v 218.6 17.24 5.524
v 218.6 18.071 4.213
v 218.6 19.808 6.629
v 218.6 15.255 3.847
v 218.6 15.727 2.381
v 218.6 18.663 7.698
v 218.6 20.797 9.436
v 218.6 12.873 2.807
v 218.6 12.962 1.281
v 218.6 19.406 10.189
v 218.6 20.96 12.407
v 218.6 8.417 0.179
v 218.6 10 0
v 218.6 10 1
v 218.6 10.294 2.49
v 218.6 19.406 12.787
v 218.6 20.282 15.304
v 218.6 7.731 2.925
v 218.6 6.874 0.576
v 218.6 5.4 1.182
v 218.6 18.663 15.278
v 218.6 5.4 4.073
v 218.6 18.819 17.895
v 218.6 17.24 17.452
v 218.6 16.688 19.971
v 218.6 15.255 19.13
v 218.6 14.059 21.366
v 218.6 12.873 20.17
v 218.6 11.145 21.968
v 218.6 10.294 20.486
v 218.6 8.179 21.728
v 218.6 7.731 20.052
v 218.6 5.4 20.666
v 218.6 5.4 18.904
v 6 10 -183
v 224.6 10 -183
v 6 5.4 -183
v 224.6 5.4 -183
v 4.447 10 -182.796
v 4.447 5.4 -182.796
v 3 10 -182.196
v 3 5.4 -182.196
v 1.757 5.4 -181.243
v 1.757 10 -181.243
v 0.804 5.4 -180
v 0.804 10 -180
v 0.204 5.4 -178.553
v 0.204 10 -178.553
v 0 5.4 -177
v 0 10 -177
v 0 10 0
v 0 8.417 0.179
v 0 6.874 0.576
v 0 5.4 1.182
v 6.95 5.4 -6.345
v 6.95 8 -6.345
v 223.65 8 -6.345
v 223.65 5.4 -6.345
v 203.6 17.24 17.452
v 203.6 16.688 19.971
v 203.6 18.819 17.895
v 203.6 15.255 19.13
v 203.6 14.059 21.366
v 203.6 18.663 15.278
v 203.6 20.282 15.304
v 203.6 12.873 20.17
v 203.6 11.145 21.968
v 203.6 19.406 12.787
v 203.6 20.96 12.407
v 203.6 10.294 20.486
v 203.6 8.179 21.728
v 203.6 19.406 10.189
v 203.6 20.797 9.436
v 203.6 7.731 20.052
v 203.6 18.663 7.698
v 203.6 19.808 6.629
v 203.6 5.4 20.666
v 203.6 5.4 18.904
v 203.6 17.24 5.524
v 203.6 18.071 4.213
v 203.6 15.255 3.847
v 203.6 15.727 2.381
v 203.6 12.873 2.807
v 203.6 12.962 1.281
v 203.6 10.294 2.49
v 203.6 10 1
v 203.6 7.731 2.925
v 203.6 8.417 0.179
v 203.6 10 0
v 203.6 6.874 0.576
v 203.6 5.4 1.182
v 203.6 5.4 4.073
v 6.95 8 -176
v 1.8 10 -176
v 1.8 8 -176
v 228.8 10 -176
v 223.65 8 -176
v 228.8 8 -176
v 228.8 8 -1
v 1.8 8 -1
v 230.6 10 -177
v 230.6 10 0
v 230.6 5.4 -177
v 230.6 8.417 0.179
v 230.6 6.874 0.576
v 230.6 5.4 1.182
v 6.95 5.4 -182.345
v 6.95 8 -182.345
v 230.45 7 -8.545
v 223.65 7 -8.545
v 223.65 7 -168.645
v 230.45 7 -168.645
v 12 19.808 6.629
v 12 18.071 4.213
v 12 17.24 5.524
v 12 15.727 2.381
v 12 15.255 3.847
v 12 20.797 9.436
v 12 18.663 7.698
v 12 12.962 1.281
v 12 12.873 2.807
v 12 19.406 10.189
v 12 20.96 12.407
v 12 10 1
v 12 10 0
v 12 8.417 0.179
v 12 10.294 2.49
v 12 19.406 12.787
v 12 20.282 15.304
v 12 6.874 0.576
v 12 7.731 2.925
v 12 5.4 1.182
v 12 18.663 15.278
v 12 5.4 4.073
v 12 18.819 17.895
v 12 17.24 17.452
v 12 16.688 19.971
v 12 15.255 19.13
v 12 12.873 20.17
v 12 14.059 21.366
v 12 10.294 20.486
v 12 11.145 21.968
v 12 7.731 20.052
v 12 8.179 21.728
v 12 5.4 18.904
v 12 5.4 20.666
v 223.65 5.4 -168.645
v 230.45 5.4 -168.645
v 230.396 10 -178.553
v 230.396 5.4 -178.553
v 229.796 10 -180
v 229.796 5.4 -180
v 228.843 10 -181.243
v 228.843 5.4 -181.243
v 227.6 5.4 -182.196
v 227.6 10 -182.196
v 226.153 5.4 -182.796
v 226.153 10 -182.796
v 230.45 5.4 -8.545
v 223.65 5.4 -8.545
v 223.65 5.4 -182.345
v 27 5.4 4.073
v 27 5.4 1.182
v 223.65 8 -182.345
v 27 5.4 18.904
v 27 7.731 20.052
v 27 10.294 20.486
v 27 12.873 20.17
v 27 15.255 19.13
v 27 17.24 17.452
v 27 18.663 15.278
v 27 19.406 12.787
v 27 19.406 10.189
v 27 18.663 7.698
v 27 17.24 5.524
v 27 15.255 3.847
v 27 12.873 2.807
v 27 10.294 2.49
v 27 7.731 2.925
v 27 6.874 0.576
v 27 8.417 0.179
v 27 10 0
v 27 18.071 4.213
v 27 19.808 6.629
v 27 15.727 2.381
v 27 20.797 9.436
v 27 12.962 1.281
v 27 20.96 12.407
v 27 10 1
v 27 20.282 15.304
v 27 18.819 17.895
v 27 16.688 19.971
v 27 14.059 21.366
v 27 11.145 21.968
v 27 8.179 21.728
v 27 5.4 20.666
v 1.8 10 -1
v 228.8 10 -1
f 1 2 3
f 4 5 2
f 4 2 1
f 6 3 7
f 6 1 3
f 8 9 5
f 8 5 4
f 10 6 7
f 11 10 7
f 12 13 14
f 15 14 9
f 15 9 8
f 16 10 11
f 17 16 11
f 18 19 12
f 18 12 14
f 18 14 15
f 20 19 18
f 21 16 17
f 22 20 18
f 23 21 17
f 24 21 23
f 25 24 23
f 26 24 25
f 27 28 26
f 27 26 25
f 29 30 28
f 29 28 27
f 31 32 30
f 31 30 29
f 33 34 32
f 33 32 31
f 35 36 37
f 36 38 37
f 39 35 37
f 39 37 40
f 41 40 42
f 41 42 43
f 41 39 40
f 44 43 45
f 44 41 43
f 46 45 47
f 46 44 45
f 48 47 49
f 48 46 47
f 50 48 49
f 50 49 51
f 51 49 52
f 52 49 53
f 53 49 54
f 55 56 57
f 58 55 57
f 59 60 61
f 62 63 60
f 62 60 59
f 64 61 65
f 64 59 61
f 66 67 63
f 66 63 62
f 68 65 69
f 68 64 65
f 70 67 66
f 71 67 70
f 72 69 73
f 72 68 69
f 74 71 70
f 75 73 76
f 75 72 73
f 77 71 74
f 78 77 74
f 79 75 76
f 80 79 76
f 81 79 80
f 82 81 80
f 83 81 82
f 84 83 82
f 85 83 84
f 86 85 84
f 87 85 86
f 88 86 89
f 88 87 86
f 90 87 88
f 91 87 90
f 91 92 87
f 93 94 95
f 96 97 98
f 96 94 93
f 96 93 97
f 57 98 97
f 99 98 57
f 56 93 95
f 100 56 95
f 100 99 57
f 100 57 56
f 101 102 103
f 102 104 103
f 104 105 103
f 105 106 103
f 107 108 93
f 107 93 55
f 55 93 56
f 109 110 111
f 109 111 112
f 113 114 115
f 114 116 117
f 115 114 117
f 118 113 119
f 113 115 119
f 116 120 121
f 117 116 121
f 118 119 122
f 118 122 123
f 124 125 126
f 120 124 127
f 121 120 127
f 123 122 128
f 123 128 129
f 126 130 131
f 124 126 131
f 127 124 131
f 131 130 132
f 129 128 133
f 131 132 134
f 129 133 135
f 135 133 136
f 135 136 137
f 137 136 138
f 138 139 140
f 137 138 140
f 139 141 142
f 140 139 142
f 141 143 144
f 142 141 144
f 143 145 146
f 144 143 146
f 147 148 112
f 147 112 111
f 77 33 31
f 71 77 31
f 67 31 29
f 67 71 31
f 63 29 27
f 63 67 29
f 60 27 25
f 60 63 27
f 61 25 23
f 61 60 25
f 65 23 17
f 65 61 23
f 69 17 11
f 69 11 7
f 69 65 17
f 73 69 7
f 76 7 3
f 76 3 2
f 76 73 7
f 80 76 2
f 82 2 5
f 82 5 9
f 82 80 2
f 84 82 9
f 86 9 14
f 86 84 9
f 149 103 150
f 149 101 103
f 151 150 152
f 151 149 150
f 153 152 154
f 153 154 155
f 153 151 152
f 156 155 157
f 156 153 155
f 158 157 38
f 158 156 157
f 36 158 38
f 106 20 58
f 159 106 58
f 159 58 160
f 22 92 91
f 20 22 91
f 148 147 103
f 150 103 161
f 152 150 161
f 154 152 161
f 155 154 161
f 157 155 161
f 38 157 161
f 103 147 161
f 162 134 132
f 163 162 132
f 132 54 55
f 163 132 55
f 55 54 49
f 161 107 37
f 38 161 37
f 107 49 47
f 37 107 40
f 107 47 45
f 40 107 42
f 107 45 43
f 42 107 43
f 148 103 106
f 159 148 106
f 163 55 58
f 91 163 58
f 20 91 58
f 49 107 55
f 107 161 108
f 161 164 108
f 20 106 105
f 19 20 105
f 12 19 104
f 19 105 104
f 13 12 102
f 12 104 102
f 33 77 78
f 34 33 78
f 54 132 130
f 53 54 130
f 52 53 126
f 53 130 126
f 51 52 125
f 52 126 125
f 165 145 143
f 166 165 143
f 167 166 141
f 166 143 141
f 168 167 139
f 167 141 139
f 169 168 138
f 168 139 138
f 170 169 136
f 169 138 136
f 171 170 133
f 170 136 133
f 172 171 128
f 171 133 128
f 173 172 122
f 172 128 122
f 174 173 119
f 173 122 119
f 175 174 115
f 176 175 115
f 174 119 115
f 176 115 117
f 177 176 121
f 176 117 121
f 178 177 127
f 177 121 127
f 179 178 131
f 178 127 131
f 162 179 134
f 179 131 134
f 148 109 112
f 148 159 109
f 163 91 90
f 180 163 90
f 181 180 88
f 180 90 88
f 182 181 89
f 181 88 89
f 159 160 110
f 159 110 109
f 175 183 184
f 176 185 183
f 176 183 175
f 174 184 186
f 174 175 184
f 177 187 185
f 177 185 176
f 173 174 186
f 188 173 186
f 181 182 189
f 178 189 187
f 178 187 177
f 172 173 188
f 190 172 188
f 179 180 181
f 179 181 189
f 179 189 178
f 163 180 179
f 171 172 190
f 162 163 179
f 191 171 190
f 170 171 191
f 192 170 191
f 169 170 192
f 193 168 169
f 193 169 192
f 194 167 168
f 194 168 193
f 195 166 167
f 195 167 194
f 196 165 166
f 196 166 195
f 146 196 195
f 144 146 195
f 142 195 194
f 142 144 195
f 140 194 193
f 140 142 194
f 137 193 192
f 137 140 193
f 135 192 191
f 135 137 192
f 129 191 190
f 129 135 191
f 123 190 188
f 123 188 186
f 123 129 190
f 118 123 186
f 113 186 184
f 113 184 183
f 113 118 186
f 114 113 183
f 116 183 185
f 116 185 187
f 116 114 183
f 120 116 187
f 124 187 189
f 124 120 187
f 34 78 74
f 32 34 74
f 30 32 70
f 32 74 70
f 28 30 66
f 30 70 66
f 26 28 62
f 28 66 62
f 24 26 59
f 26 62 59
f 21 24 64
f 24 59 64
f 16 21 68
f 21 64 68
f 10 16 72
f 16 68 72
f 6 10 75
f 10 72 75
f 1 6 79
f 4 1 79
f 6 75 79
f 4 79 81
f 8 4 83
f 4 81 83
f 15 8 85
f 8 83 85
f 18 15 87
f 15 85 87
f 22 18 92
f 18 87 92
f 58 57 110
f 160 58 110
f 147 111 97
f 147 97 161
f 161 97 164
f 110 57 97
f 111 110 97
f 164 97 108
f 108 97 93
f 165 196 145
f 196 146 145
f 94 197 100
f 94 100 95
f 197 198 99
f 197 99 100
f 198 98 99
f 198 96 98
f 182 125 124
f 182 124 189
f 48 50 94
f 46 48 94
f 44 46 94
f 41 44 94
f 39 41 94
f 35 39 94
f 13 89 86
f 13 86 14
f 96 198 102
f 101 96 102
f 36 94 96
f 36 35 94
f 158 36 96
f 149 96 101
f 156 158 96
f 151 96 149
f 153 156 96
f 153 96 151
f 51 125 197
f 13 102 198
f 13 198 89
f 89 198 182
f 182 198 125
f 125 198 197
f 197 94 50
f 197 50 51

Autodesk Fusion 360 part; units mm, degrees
sketch "Sketch1" plane through (0, 0, 0) normal (0, 1, 0) x (1, 0, 0)
  line L0 (0, 0) -> (230.6, 0)
  line L1 (230.6, 0) -> (230.6, 183)
  line L2 (230.6, 183) -> (0, 183)
  line L3 (0, 183) -> (0, 0)
  dimension "d1" = 230.6
  dimension "d2" = 183
extrude "Extrude1" add sketch "Sketch1" along normal blind 10
sketch "Sketch9" plane through (0, 0, 0) normal (-1, 0, 0) x (0, 0, 1)
  line L0 (-183, 0) -> (0, 0)
  line L1 (0, 0) -> (0, 10)
  line L2 (0, 10) -> (-183, 10)
  line L3 (-183, 10) -> (-183, 0)
  circle A0 centre (11.4881, 10.5) radius 10.5
  line L4 (11.4881, 0) -> (0, 0)
  circle A1 centre (11.4881, 10.5) radius 9
  line L5 (0, 0) -> (1, 0)
  line L6 (1, 0) -> (1, 10)
  line L7 (1, 10) -> (0, 10)
  line L8 (0, 10) -> (0, 0)
  dimension "d69" = 21
  dimension "d70" = 18
  dimension "d94" = 1
extrude "Extrude8" add sketch "Sketch9" against normal up to surface (230.6 mm away) contours L1 L4 L5 L6 L7 L8 | A0 L4 L6 | A0
sketch "Sketch10" plane through (0, 0, 0) normal (0, -1, 0) x (1, 0, 0)
  line L0 (230.6, -183) -> (230.6, 11.4881)
  line L1 (230.6, 11.4881) -> (0, 11.4881)
  line L2 (0, 11.4881) -> (0, -183)
  line L3 (230.6, 0) -> (218.6, 0)
  line L4 (218.6, 0) -> (218.6, 22)
  line L5 (218.6, 22) -> (230.6, 22)
  line L6 (230.6, 22) -> (230.6, 0)
  line L7 (203.6, 0) -> (27, 0)
  line L8 (27, 0) -> (27, 22)
  line L9 (27, 22) -> (203.6, 22)
  line L10 (203.6, 22) -> (203.6, 0)
  line L11 (0, 0) -> (12, 0)
  line L12 (12, 0) -> (12, 22)
  line L13 (12, 22) -> (0, 22)
  line L14 (0, 22) -> (0, 0)
  line L15 (0, -183) -> (230.6, -183)
  dimension "d73" = 22
  dimension "d74" = 12
  dimension "d75" = 12
  dimension "d76" = 15
  dimension "d77" = 15
extrude "Extrude9" cut sketch "Sketch10" against normal through all contours L0 L1 L3 L4 L6 | L1 L4 L5 L6 | L1 L2 L11 L12 L14 | L1 L12 L13 L14 | L1 L7 L8 L10 | L1 L8 L9 L10
sketch "Sketch11" plane through (0, 10, 0) normal (0, 1, 0) x (-1, 0, 0)
  line L0 (0, -183) -> (0, 0)
  line L1 (-1.8, -176) -> (-228.8, -176)
  line L2 (-228.8, -176) -> (-228.8, -1)
  line L3 (-228.8, -1) -> (-1.8, -1)
  line L4 (-1.8, -1) -> (-1.8, -176)
  line L5 (-115.3, -124.4699) -> (-115.3, -51.5615) construction
  line L6 (-230.6, 0) -> (-230.6, -183)
  line L7 (-230.6, -183) -> (0, -183)
  line L8 (-12, 0) -> (-12, 1)
  line L9 (-12, 1) -> (-27, 1)
  line L10 (-27, 1) -> (-27, 0)
  line L11 (-27, 0) -> (-203.6, 0)
  line L12 (-203.6, 0) -> (-203.6, 1)
  line L13 (-203.6, 1) -> (-218.6, 1)
  line L14 (-218.6, 1) -> (-218.6, 0)
  line L15 (-218.6, 0) -> (-230.6, 0)
  line L16 (0, 0) -> (-12, 0)
  dimension "d79" = 227
  dimension "d80" = 175
  dimension "d100" = 1
extrude "Extrude10" cut sketch "Sketch11" against normal blind 2 contours L1 L2 L3 L4
sketch "Sketch12" plane through (0, 8, 0) normal (0, 1, 0) x (-1, 0, 0)
  line L0 (-1.8, -1) -> (-228.8, -1)
  line L1 (-1.8, -176) -> (-1.8, -1)
  line L2 (-6.95, -6.345) -> (-223.65, -6.345)
  line L3 (-223.65, -6.345) -> (-223.65, -182.345)
  line L4 (-223.65, -182.345) -> (-6.95, -182.345)
  line L5 (-6.95, -182.345) -> (-6.95, -6.345)
  line L6 (-10.47, -167.125) -> (-220.13, -167.125)
  line L7 (-220.13, -167.125) -> (-220.13, -9.875)
  line L8 (-220.13, -9.875) -> (-10.47, -9.875)
  line L9 (-10.47, -9.875) -> (-10.47, -167.125)
  line L10 (-83.8338, -88.5) -> (-143.8338, -88.5) construction
  line L11 (-115.3, -111.7944) -> (-115.3, -61.4121) construction
  line L12 (-228.8, -1) -> (-228.8, -176)
  line L13 (-228.8, -176) -> (-1.8, -176)
  dimension "d84" = 176
  dimension "d85" = 216.7
  dimension "d86" = 209.66
  dimension "d87" = 157.25
  dimension "d88" = 3.52
  dimension "d89" = 3.53
extrude "Extrude11" cut sketch "Sketch12" against normal blind 2.6 contours L2 L3 L5 L13 | L3 L4 L5 L13 | L6 L7 L8 L9
fillet "Fillet1" radius 6 2 edges at (0, 5, -183) (230.6, 5, -183)
sketch "Sketch15" plane through (12, 0, 0) normal (-1, 0, 0) x (0, 0, 1)
  line L0 (1, 10) -> (0, 10)
  line L1 (0, 10) -> (0, 0)
  line L2 (0, 0) -> (11.4881, 0)
  arc A0 (11.4881, 0) -> (1, 10) centre (11.4881, 10.5) ccw
  circle A1 centre (11.4881, 10.5) radius 9
  circle A2 centre (11.4881, 10.5) radius 11.499
  line L3 (0, 0) -> (6.8002, 0)
extrude "Extrude14" add sketch "Sketch15" along normal blind 12 and the other way blind 218.6 contours L1 L2 A2 L3
sketch "Sketch13" plane through (0, 0, 0) normal (-1, 0, 0) x (0, 0, 1)
  line L0 (-177, 10) -> (-177, 0)
  line L1 (-177, 0) -> (6.8002, 0)
  line L2 (0, 10) -> (-177, 10)
  line L3 (-187, -4.6) -> (23, -4.6)
  line L4 (23, -4.6) -> (23, 5.4)
  line L5 (23, 5.4) -> (-187, 5.4)
  line L6 (-187, 5.4) -> (-187, -4.6)
  arc A0 (0, 10) -> (6.8002, 0) centre (11.4881, 10.5) ccw
  dimension "d95" = 4.6
  dimension "d96" = 10
  dimension "d97" = 10
  dimension "d98" = 210
extrude "Extrude12" cut sketch "Sketch13" against normal through all contours L0 L1 L5 A0 | L0 L1 L3 L4 L5 L6 A0
sketch "Sketch14" plane through (0, 5.4, 0) normal (0, -1, 0) x (1, 0, 0)
  line L0 (218.6, 18.9036) -> (218.6, 20.6663)
  line L1 (12, 18.9036) -> (27, 18.9036)
  line L2 (203.6, 20.6663) -> (203.6, 18.9036)
  line L3 (27, 18.9036) -> (27, 20.6663)
  line L4 (12, 20.6663) -> (12, 18.9036)
  line L5 (27, 20.6663) -> (12, 20.6663)
  line L6 (203.6, 18.9036) -> (218.6, 18.9036)
  line L7 (218.6, 20.6663) -> (203.6, 20.6663)
  line L8 (223.65, -8.545) -> (230.45, -8.545)
  line L9 (230.45, -8.545) -> (230.45, -168.645)
  line L10 (230.45, -168.645) -> (223.65, -168.645)
  line L11 (223.65, -168.645) -> (223.65, -8.545)
  line L12 (223.65, -182.345) -> (223.65, -6.345)
  dimension "d101" = 6.8
  dimension "d102" = 2.2
  dimension "d103" = 160.1
extrude "Extrude13" cut sketch "Sketch14" against normal blind 1.6 contours L8 L9 L10 L11 L12
